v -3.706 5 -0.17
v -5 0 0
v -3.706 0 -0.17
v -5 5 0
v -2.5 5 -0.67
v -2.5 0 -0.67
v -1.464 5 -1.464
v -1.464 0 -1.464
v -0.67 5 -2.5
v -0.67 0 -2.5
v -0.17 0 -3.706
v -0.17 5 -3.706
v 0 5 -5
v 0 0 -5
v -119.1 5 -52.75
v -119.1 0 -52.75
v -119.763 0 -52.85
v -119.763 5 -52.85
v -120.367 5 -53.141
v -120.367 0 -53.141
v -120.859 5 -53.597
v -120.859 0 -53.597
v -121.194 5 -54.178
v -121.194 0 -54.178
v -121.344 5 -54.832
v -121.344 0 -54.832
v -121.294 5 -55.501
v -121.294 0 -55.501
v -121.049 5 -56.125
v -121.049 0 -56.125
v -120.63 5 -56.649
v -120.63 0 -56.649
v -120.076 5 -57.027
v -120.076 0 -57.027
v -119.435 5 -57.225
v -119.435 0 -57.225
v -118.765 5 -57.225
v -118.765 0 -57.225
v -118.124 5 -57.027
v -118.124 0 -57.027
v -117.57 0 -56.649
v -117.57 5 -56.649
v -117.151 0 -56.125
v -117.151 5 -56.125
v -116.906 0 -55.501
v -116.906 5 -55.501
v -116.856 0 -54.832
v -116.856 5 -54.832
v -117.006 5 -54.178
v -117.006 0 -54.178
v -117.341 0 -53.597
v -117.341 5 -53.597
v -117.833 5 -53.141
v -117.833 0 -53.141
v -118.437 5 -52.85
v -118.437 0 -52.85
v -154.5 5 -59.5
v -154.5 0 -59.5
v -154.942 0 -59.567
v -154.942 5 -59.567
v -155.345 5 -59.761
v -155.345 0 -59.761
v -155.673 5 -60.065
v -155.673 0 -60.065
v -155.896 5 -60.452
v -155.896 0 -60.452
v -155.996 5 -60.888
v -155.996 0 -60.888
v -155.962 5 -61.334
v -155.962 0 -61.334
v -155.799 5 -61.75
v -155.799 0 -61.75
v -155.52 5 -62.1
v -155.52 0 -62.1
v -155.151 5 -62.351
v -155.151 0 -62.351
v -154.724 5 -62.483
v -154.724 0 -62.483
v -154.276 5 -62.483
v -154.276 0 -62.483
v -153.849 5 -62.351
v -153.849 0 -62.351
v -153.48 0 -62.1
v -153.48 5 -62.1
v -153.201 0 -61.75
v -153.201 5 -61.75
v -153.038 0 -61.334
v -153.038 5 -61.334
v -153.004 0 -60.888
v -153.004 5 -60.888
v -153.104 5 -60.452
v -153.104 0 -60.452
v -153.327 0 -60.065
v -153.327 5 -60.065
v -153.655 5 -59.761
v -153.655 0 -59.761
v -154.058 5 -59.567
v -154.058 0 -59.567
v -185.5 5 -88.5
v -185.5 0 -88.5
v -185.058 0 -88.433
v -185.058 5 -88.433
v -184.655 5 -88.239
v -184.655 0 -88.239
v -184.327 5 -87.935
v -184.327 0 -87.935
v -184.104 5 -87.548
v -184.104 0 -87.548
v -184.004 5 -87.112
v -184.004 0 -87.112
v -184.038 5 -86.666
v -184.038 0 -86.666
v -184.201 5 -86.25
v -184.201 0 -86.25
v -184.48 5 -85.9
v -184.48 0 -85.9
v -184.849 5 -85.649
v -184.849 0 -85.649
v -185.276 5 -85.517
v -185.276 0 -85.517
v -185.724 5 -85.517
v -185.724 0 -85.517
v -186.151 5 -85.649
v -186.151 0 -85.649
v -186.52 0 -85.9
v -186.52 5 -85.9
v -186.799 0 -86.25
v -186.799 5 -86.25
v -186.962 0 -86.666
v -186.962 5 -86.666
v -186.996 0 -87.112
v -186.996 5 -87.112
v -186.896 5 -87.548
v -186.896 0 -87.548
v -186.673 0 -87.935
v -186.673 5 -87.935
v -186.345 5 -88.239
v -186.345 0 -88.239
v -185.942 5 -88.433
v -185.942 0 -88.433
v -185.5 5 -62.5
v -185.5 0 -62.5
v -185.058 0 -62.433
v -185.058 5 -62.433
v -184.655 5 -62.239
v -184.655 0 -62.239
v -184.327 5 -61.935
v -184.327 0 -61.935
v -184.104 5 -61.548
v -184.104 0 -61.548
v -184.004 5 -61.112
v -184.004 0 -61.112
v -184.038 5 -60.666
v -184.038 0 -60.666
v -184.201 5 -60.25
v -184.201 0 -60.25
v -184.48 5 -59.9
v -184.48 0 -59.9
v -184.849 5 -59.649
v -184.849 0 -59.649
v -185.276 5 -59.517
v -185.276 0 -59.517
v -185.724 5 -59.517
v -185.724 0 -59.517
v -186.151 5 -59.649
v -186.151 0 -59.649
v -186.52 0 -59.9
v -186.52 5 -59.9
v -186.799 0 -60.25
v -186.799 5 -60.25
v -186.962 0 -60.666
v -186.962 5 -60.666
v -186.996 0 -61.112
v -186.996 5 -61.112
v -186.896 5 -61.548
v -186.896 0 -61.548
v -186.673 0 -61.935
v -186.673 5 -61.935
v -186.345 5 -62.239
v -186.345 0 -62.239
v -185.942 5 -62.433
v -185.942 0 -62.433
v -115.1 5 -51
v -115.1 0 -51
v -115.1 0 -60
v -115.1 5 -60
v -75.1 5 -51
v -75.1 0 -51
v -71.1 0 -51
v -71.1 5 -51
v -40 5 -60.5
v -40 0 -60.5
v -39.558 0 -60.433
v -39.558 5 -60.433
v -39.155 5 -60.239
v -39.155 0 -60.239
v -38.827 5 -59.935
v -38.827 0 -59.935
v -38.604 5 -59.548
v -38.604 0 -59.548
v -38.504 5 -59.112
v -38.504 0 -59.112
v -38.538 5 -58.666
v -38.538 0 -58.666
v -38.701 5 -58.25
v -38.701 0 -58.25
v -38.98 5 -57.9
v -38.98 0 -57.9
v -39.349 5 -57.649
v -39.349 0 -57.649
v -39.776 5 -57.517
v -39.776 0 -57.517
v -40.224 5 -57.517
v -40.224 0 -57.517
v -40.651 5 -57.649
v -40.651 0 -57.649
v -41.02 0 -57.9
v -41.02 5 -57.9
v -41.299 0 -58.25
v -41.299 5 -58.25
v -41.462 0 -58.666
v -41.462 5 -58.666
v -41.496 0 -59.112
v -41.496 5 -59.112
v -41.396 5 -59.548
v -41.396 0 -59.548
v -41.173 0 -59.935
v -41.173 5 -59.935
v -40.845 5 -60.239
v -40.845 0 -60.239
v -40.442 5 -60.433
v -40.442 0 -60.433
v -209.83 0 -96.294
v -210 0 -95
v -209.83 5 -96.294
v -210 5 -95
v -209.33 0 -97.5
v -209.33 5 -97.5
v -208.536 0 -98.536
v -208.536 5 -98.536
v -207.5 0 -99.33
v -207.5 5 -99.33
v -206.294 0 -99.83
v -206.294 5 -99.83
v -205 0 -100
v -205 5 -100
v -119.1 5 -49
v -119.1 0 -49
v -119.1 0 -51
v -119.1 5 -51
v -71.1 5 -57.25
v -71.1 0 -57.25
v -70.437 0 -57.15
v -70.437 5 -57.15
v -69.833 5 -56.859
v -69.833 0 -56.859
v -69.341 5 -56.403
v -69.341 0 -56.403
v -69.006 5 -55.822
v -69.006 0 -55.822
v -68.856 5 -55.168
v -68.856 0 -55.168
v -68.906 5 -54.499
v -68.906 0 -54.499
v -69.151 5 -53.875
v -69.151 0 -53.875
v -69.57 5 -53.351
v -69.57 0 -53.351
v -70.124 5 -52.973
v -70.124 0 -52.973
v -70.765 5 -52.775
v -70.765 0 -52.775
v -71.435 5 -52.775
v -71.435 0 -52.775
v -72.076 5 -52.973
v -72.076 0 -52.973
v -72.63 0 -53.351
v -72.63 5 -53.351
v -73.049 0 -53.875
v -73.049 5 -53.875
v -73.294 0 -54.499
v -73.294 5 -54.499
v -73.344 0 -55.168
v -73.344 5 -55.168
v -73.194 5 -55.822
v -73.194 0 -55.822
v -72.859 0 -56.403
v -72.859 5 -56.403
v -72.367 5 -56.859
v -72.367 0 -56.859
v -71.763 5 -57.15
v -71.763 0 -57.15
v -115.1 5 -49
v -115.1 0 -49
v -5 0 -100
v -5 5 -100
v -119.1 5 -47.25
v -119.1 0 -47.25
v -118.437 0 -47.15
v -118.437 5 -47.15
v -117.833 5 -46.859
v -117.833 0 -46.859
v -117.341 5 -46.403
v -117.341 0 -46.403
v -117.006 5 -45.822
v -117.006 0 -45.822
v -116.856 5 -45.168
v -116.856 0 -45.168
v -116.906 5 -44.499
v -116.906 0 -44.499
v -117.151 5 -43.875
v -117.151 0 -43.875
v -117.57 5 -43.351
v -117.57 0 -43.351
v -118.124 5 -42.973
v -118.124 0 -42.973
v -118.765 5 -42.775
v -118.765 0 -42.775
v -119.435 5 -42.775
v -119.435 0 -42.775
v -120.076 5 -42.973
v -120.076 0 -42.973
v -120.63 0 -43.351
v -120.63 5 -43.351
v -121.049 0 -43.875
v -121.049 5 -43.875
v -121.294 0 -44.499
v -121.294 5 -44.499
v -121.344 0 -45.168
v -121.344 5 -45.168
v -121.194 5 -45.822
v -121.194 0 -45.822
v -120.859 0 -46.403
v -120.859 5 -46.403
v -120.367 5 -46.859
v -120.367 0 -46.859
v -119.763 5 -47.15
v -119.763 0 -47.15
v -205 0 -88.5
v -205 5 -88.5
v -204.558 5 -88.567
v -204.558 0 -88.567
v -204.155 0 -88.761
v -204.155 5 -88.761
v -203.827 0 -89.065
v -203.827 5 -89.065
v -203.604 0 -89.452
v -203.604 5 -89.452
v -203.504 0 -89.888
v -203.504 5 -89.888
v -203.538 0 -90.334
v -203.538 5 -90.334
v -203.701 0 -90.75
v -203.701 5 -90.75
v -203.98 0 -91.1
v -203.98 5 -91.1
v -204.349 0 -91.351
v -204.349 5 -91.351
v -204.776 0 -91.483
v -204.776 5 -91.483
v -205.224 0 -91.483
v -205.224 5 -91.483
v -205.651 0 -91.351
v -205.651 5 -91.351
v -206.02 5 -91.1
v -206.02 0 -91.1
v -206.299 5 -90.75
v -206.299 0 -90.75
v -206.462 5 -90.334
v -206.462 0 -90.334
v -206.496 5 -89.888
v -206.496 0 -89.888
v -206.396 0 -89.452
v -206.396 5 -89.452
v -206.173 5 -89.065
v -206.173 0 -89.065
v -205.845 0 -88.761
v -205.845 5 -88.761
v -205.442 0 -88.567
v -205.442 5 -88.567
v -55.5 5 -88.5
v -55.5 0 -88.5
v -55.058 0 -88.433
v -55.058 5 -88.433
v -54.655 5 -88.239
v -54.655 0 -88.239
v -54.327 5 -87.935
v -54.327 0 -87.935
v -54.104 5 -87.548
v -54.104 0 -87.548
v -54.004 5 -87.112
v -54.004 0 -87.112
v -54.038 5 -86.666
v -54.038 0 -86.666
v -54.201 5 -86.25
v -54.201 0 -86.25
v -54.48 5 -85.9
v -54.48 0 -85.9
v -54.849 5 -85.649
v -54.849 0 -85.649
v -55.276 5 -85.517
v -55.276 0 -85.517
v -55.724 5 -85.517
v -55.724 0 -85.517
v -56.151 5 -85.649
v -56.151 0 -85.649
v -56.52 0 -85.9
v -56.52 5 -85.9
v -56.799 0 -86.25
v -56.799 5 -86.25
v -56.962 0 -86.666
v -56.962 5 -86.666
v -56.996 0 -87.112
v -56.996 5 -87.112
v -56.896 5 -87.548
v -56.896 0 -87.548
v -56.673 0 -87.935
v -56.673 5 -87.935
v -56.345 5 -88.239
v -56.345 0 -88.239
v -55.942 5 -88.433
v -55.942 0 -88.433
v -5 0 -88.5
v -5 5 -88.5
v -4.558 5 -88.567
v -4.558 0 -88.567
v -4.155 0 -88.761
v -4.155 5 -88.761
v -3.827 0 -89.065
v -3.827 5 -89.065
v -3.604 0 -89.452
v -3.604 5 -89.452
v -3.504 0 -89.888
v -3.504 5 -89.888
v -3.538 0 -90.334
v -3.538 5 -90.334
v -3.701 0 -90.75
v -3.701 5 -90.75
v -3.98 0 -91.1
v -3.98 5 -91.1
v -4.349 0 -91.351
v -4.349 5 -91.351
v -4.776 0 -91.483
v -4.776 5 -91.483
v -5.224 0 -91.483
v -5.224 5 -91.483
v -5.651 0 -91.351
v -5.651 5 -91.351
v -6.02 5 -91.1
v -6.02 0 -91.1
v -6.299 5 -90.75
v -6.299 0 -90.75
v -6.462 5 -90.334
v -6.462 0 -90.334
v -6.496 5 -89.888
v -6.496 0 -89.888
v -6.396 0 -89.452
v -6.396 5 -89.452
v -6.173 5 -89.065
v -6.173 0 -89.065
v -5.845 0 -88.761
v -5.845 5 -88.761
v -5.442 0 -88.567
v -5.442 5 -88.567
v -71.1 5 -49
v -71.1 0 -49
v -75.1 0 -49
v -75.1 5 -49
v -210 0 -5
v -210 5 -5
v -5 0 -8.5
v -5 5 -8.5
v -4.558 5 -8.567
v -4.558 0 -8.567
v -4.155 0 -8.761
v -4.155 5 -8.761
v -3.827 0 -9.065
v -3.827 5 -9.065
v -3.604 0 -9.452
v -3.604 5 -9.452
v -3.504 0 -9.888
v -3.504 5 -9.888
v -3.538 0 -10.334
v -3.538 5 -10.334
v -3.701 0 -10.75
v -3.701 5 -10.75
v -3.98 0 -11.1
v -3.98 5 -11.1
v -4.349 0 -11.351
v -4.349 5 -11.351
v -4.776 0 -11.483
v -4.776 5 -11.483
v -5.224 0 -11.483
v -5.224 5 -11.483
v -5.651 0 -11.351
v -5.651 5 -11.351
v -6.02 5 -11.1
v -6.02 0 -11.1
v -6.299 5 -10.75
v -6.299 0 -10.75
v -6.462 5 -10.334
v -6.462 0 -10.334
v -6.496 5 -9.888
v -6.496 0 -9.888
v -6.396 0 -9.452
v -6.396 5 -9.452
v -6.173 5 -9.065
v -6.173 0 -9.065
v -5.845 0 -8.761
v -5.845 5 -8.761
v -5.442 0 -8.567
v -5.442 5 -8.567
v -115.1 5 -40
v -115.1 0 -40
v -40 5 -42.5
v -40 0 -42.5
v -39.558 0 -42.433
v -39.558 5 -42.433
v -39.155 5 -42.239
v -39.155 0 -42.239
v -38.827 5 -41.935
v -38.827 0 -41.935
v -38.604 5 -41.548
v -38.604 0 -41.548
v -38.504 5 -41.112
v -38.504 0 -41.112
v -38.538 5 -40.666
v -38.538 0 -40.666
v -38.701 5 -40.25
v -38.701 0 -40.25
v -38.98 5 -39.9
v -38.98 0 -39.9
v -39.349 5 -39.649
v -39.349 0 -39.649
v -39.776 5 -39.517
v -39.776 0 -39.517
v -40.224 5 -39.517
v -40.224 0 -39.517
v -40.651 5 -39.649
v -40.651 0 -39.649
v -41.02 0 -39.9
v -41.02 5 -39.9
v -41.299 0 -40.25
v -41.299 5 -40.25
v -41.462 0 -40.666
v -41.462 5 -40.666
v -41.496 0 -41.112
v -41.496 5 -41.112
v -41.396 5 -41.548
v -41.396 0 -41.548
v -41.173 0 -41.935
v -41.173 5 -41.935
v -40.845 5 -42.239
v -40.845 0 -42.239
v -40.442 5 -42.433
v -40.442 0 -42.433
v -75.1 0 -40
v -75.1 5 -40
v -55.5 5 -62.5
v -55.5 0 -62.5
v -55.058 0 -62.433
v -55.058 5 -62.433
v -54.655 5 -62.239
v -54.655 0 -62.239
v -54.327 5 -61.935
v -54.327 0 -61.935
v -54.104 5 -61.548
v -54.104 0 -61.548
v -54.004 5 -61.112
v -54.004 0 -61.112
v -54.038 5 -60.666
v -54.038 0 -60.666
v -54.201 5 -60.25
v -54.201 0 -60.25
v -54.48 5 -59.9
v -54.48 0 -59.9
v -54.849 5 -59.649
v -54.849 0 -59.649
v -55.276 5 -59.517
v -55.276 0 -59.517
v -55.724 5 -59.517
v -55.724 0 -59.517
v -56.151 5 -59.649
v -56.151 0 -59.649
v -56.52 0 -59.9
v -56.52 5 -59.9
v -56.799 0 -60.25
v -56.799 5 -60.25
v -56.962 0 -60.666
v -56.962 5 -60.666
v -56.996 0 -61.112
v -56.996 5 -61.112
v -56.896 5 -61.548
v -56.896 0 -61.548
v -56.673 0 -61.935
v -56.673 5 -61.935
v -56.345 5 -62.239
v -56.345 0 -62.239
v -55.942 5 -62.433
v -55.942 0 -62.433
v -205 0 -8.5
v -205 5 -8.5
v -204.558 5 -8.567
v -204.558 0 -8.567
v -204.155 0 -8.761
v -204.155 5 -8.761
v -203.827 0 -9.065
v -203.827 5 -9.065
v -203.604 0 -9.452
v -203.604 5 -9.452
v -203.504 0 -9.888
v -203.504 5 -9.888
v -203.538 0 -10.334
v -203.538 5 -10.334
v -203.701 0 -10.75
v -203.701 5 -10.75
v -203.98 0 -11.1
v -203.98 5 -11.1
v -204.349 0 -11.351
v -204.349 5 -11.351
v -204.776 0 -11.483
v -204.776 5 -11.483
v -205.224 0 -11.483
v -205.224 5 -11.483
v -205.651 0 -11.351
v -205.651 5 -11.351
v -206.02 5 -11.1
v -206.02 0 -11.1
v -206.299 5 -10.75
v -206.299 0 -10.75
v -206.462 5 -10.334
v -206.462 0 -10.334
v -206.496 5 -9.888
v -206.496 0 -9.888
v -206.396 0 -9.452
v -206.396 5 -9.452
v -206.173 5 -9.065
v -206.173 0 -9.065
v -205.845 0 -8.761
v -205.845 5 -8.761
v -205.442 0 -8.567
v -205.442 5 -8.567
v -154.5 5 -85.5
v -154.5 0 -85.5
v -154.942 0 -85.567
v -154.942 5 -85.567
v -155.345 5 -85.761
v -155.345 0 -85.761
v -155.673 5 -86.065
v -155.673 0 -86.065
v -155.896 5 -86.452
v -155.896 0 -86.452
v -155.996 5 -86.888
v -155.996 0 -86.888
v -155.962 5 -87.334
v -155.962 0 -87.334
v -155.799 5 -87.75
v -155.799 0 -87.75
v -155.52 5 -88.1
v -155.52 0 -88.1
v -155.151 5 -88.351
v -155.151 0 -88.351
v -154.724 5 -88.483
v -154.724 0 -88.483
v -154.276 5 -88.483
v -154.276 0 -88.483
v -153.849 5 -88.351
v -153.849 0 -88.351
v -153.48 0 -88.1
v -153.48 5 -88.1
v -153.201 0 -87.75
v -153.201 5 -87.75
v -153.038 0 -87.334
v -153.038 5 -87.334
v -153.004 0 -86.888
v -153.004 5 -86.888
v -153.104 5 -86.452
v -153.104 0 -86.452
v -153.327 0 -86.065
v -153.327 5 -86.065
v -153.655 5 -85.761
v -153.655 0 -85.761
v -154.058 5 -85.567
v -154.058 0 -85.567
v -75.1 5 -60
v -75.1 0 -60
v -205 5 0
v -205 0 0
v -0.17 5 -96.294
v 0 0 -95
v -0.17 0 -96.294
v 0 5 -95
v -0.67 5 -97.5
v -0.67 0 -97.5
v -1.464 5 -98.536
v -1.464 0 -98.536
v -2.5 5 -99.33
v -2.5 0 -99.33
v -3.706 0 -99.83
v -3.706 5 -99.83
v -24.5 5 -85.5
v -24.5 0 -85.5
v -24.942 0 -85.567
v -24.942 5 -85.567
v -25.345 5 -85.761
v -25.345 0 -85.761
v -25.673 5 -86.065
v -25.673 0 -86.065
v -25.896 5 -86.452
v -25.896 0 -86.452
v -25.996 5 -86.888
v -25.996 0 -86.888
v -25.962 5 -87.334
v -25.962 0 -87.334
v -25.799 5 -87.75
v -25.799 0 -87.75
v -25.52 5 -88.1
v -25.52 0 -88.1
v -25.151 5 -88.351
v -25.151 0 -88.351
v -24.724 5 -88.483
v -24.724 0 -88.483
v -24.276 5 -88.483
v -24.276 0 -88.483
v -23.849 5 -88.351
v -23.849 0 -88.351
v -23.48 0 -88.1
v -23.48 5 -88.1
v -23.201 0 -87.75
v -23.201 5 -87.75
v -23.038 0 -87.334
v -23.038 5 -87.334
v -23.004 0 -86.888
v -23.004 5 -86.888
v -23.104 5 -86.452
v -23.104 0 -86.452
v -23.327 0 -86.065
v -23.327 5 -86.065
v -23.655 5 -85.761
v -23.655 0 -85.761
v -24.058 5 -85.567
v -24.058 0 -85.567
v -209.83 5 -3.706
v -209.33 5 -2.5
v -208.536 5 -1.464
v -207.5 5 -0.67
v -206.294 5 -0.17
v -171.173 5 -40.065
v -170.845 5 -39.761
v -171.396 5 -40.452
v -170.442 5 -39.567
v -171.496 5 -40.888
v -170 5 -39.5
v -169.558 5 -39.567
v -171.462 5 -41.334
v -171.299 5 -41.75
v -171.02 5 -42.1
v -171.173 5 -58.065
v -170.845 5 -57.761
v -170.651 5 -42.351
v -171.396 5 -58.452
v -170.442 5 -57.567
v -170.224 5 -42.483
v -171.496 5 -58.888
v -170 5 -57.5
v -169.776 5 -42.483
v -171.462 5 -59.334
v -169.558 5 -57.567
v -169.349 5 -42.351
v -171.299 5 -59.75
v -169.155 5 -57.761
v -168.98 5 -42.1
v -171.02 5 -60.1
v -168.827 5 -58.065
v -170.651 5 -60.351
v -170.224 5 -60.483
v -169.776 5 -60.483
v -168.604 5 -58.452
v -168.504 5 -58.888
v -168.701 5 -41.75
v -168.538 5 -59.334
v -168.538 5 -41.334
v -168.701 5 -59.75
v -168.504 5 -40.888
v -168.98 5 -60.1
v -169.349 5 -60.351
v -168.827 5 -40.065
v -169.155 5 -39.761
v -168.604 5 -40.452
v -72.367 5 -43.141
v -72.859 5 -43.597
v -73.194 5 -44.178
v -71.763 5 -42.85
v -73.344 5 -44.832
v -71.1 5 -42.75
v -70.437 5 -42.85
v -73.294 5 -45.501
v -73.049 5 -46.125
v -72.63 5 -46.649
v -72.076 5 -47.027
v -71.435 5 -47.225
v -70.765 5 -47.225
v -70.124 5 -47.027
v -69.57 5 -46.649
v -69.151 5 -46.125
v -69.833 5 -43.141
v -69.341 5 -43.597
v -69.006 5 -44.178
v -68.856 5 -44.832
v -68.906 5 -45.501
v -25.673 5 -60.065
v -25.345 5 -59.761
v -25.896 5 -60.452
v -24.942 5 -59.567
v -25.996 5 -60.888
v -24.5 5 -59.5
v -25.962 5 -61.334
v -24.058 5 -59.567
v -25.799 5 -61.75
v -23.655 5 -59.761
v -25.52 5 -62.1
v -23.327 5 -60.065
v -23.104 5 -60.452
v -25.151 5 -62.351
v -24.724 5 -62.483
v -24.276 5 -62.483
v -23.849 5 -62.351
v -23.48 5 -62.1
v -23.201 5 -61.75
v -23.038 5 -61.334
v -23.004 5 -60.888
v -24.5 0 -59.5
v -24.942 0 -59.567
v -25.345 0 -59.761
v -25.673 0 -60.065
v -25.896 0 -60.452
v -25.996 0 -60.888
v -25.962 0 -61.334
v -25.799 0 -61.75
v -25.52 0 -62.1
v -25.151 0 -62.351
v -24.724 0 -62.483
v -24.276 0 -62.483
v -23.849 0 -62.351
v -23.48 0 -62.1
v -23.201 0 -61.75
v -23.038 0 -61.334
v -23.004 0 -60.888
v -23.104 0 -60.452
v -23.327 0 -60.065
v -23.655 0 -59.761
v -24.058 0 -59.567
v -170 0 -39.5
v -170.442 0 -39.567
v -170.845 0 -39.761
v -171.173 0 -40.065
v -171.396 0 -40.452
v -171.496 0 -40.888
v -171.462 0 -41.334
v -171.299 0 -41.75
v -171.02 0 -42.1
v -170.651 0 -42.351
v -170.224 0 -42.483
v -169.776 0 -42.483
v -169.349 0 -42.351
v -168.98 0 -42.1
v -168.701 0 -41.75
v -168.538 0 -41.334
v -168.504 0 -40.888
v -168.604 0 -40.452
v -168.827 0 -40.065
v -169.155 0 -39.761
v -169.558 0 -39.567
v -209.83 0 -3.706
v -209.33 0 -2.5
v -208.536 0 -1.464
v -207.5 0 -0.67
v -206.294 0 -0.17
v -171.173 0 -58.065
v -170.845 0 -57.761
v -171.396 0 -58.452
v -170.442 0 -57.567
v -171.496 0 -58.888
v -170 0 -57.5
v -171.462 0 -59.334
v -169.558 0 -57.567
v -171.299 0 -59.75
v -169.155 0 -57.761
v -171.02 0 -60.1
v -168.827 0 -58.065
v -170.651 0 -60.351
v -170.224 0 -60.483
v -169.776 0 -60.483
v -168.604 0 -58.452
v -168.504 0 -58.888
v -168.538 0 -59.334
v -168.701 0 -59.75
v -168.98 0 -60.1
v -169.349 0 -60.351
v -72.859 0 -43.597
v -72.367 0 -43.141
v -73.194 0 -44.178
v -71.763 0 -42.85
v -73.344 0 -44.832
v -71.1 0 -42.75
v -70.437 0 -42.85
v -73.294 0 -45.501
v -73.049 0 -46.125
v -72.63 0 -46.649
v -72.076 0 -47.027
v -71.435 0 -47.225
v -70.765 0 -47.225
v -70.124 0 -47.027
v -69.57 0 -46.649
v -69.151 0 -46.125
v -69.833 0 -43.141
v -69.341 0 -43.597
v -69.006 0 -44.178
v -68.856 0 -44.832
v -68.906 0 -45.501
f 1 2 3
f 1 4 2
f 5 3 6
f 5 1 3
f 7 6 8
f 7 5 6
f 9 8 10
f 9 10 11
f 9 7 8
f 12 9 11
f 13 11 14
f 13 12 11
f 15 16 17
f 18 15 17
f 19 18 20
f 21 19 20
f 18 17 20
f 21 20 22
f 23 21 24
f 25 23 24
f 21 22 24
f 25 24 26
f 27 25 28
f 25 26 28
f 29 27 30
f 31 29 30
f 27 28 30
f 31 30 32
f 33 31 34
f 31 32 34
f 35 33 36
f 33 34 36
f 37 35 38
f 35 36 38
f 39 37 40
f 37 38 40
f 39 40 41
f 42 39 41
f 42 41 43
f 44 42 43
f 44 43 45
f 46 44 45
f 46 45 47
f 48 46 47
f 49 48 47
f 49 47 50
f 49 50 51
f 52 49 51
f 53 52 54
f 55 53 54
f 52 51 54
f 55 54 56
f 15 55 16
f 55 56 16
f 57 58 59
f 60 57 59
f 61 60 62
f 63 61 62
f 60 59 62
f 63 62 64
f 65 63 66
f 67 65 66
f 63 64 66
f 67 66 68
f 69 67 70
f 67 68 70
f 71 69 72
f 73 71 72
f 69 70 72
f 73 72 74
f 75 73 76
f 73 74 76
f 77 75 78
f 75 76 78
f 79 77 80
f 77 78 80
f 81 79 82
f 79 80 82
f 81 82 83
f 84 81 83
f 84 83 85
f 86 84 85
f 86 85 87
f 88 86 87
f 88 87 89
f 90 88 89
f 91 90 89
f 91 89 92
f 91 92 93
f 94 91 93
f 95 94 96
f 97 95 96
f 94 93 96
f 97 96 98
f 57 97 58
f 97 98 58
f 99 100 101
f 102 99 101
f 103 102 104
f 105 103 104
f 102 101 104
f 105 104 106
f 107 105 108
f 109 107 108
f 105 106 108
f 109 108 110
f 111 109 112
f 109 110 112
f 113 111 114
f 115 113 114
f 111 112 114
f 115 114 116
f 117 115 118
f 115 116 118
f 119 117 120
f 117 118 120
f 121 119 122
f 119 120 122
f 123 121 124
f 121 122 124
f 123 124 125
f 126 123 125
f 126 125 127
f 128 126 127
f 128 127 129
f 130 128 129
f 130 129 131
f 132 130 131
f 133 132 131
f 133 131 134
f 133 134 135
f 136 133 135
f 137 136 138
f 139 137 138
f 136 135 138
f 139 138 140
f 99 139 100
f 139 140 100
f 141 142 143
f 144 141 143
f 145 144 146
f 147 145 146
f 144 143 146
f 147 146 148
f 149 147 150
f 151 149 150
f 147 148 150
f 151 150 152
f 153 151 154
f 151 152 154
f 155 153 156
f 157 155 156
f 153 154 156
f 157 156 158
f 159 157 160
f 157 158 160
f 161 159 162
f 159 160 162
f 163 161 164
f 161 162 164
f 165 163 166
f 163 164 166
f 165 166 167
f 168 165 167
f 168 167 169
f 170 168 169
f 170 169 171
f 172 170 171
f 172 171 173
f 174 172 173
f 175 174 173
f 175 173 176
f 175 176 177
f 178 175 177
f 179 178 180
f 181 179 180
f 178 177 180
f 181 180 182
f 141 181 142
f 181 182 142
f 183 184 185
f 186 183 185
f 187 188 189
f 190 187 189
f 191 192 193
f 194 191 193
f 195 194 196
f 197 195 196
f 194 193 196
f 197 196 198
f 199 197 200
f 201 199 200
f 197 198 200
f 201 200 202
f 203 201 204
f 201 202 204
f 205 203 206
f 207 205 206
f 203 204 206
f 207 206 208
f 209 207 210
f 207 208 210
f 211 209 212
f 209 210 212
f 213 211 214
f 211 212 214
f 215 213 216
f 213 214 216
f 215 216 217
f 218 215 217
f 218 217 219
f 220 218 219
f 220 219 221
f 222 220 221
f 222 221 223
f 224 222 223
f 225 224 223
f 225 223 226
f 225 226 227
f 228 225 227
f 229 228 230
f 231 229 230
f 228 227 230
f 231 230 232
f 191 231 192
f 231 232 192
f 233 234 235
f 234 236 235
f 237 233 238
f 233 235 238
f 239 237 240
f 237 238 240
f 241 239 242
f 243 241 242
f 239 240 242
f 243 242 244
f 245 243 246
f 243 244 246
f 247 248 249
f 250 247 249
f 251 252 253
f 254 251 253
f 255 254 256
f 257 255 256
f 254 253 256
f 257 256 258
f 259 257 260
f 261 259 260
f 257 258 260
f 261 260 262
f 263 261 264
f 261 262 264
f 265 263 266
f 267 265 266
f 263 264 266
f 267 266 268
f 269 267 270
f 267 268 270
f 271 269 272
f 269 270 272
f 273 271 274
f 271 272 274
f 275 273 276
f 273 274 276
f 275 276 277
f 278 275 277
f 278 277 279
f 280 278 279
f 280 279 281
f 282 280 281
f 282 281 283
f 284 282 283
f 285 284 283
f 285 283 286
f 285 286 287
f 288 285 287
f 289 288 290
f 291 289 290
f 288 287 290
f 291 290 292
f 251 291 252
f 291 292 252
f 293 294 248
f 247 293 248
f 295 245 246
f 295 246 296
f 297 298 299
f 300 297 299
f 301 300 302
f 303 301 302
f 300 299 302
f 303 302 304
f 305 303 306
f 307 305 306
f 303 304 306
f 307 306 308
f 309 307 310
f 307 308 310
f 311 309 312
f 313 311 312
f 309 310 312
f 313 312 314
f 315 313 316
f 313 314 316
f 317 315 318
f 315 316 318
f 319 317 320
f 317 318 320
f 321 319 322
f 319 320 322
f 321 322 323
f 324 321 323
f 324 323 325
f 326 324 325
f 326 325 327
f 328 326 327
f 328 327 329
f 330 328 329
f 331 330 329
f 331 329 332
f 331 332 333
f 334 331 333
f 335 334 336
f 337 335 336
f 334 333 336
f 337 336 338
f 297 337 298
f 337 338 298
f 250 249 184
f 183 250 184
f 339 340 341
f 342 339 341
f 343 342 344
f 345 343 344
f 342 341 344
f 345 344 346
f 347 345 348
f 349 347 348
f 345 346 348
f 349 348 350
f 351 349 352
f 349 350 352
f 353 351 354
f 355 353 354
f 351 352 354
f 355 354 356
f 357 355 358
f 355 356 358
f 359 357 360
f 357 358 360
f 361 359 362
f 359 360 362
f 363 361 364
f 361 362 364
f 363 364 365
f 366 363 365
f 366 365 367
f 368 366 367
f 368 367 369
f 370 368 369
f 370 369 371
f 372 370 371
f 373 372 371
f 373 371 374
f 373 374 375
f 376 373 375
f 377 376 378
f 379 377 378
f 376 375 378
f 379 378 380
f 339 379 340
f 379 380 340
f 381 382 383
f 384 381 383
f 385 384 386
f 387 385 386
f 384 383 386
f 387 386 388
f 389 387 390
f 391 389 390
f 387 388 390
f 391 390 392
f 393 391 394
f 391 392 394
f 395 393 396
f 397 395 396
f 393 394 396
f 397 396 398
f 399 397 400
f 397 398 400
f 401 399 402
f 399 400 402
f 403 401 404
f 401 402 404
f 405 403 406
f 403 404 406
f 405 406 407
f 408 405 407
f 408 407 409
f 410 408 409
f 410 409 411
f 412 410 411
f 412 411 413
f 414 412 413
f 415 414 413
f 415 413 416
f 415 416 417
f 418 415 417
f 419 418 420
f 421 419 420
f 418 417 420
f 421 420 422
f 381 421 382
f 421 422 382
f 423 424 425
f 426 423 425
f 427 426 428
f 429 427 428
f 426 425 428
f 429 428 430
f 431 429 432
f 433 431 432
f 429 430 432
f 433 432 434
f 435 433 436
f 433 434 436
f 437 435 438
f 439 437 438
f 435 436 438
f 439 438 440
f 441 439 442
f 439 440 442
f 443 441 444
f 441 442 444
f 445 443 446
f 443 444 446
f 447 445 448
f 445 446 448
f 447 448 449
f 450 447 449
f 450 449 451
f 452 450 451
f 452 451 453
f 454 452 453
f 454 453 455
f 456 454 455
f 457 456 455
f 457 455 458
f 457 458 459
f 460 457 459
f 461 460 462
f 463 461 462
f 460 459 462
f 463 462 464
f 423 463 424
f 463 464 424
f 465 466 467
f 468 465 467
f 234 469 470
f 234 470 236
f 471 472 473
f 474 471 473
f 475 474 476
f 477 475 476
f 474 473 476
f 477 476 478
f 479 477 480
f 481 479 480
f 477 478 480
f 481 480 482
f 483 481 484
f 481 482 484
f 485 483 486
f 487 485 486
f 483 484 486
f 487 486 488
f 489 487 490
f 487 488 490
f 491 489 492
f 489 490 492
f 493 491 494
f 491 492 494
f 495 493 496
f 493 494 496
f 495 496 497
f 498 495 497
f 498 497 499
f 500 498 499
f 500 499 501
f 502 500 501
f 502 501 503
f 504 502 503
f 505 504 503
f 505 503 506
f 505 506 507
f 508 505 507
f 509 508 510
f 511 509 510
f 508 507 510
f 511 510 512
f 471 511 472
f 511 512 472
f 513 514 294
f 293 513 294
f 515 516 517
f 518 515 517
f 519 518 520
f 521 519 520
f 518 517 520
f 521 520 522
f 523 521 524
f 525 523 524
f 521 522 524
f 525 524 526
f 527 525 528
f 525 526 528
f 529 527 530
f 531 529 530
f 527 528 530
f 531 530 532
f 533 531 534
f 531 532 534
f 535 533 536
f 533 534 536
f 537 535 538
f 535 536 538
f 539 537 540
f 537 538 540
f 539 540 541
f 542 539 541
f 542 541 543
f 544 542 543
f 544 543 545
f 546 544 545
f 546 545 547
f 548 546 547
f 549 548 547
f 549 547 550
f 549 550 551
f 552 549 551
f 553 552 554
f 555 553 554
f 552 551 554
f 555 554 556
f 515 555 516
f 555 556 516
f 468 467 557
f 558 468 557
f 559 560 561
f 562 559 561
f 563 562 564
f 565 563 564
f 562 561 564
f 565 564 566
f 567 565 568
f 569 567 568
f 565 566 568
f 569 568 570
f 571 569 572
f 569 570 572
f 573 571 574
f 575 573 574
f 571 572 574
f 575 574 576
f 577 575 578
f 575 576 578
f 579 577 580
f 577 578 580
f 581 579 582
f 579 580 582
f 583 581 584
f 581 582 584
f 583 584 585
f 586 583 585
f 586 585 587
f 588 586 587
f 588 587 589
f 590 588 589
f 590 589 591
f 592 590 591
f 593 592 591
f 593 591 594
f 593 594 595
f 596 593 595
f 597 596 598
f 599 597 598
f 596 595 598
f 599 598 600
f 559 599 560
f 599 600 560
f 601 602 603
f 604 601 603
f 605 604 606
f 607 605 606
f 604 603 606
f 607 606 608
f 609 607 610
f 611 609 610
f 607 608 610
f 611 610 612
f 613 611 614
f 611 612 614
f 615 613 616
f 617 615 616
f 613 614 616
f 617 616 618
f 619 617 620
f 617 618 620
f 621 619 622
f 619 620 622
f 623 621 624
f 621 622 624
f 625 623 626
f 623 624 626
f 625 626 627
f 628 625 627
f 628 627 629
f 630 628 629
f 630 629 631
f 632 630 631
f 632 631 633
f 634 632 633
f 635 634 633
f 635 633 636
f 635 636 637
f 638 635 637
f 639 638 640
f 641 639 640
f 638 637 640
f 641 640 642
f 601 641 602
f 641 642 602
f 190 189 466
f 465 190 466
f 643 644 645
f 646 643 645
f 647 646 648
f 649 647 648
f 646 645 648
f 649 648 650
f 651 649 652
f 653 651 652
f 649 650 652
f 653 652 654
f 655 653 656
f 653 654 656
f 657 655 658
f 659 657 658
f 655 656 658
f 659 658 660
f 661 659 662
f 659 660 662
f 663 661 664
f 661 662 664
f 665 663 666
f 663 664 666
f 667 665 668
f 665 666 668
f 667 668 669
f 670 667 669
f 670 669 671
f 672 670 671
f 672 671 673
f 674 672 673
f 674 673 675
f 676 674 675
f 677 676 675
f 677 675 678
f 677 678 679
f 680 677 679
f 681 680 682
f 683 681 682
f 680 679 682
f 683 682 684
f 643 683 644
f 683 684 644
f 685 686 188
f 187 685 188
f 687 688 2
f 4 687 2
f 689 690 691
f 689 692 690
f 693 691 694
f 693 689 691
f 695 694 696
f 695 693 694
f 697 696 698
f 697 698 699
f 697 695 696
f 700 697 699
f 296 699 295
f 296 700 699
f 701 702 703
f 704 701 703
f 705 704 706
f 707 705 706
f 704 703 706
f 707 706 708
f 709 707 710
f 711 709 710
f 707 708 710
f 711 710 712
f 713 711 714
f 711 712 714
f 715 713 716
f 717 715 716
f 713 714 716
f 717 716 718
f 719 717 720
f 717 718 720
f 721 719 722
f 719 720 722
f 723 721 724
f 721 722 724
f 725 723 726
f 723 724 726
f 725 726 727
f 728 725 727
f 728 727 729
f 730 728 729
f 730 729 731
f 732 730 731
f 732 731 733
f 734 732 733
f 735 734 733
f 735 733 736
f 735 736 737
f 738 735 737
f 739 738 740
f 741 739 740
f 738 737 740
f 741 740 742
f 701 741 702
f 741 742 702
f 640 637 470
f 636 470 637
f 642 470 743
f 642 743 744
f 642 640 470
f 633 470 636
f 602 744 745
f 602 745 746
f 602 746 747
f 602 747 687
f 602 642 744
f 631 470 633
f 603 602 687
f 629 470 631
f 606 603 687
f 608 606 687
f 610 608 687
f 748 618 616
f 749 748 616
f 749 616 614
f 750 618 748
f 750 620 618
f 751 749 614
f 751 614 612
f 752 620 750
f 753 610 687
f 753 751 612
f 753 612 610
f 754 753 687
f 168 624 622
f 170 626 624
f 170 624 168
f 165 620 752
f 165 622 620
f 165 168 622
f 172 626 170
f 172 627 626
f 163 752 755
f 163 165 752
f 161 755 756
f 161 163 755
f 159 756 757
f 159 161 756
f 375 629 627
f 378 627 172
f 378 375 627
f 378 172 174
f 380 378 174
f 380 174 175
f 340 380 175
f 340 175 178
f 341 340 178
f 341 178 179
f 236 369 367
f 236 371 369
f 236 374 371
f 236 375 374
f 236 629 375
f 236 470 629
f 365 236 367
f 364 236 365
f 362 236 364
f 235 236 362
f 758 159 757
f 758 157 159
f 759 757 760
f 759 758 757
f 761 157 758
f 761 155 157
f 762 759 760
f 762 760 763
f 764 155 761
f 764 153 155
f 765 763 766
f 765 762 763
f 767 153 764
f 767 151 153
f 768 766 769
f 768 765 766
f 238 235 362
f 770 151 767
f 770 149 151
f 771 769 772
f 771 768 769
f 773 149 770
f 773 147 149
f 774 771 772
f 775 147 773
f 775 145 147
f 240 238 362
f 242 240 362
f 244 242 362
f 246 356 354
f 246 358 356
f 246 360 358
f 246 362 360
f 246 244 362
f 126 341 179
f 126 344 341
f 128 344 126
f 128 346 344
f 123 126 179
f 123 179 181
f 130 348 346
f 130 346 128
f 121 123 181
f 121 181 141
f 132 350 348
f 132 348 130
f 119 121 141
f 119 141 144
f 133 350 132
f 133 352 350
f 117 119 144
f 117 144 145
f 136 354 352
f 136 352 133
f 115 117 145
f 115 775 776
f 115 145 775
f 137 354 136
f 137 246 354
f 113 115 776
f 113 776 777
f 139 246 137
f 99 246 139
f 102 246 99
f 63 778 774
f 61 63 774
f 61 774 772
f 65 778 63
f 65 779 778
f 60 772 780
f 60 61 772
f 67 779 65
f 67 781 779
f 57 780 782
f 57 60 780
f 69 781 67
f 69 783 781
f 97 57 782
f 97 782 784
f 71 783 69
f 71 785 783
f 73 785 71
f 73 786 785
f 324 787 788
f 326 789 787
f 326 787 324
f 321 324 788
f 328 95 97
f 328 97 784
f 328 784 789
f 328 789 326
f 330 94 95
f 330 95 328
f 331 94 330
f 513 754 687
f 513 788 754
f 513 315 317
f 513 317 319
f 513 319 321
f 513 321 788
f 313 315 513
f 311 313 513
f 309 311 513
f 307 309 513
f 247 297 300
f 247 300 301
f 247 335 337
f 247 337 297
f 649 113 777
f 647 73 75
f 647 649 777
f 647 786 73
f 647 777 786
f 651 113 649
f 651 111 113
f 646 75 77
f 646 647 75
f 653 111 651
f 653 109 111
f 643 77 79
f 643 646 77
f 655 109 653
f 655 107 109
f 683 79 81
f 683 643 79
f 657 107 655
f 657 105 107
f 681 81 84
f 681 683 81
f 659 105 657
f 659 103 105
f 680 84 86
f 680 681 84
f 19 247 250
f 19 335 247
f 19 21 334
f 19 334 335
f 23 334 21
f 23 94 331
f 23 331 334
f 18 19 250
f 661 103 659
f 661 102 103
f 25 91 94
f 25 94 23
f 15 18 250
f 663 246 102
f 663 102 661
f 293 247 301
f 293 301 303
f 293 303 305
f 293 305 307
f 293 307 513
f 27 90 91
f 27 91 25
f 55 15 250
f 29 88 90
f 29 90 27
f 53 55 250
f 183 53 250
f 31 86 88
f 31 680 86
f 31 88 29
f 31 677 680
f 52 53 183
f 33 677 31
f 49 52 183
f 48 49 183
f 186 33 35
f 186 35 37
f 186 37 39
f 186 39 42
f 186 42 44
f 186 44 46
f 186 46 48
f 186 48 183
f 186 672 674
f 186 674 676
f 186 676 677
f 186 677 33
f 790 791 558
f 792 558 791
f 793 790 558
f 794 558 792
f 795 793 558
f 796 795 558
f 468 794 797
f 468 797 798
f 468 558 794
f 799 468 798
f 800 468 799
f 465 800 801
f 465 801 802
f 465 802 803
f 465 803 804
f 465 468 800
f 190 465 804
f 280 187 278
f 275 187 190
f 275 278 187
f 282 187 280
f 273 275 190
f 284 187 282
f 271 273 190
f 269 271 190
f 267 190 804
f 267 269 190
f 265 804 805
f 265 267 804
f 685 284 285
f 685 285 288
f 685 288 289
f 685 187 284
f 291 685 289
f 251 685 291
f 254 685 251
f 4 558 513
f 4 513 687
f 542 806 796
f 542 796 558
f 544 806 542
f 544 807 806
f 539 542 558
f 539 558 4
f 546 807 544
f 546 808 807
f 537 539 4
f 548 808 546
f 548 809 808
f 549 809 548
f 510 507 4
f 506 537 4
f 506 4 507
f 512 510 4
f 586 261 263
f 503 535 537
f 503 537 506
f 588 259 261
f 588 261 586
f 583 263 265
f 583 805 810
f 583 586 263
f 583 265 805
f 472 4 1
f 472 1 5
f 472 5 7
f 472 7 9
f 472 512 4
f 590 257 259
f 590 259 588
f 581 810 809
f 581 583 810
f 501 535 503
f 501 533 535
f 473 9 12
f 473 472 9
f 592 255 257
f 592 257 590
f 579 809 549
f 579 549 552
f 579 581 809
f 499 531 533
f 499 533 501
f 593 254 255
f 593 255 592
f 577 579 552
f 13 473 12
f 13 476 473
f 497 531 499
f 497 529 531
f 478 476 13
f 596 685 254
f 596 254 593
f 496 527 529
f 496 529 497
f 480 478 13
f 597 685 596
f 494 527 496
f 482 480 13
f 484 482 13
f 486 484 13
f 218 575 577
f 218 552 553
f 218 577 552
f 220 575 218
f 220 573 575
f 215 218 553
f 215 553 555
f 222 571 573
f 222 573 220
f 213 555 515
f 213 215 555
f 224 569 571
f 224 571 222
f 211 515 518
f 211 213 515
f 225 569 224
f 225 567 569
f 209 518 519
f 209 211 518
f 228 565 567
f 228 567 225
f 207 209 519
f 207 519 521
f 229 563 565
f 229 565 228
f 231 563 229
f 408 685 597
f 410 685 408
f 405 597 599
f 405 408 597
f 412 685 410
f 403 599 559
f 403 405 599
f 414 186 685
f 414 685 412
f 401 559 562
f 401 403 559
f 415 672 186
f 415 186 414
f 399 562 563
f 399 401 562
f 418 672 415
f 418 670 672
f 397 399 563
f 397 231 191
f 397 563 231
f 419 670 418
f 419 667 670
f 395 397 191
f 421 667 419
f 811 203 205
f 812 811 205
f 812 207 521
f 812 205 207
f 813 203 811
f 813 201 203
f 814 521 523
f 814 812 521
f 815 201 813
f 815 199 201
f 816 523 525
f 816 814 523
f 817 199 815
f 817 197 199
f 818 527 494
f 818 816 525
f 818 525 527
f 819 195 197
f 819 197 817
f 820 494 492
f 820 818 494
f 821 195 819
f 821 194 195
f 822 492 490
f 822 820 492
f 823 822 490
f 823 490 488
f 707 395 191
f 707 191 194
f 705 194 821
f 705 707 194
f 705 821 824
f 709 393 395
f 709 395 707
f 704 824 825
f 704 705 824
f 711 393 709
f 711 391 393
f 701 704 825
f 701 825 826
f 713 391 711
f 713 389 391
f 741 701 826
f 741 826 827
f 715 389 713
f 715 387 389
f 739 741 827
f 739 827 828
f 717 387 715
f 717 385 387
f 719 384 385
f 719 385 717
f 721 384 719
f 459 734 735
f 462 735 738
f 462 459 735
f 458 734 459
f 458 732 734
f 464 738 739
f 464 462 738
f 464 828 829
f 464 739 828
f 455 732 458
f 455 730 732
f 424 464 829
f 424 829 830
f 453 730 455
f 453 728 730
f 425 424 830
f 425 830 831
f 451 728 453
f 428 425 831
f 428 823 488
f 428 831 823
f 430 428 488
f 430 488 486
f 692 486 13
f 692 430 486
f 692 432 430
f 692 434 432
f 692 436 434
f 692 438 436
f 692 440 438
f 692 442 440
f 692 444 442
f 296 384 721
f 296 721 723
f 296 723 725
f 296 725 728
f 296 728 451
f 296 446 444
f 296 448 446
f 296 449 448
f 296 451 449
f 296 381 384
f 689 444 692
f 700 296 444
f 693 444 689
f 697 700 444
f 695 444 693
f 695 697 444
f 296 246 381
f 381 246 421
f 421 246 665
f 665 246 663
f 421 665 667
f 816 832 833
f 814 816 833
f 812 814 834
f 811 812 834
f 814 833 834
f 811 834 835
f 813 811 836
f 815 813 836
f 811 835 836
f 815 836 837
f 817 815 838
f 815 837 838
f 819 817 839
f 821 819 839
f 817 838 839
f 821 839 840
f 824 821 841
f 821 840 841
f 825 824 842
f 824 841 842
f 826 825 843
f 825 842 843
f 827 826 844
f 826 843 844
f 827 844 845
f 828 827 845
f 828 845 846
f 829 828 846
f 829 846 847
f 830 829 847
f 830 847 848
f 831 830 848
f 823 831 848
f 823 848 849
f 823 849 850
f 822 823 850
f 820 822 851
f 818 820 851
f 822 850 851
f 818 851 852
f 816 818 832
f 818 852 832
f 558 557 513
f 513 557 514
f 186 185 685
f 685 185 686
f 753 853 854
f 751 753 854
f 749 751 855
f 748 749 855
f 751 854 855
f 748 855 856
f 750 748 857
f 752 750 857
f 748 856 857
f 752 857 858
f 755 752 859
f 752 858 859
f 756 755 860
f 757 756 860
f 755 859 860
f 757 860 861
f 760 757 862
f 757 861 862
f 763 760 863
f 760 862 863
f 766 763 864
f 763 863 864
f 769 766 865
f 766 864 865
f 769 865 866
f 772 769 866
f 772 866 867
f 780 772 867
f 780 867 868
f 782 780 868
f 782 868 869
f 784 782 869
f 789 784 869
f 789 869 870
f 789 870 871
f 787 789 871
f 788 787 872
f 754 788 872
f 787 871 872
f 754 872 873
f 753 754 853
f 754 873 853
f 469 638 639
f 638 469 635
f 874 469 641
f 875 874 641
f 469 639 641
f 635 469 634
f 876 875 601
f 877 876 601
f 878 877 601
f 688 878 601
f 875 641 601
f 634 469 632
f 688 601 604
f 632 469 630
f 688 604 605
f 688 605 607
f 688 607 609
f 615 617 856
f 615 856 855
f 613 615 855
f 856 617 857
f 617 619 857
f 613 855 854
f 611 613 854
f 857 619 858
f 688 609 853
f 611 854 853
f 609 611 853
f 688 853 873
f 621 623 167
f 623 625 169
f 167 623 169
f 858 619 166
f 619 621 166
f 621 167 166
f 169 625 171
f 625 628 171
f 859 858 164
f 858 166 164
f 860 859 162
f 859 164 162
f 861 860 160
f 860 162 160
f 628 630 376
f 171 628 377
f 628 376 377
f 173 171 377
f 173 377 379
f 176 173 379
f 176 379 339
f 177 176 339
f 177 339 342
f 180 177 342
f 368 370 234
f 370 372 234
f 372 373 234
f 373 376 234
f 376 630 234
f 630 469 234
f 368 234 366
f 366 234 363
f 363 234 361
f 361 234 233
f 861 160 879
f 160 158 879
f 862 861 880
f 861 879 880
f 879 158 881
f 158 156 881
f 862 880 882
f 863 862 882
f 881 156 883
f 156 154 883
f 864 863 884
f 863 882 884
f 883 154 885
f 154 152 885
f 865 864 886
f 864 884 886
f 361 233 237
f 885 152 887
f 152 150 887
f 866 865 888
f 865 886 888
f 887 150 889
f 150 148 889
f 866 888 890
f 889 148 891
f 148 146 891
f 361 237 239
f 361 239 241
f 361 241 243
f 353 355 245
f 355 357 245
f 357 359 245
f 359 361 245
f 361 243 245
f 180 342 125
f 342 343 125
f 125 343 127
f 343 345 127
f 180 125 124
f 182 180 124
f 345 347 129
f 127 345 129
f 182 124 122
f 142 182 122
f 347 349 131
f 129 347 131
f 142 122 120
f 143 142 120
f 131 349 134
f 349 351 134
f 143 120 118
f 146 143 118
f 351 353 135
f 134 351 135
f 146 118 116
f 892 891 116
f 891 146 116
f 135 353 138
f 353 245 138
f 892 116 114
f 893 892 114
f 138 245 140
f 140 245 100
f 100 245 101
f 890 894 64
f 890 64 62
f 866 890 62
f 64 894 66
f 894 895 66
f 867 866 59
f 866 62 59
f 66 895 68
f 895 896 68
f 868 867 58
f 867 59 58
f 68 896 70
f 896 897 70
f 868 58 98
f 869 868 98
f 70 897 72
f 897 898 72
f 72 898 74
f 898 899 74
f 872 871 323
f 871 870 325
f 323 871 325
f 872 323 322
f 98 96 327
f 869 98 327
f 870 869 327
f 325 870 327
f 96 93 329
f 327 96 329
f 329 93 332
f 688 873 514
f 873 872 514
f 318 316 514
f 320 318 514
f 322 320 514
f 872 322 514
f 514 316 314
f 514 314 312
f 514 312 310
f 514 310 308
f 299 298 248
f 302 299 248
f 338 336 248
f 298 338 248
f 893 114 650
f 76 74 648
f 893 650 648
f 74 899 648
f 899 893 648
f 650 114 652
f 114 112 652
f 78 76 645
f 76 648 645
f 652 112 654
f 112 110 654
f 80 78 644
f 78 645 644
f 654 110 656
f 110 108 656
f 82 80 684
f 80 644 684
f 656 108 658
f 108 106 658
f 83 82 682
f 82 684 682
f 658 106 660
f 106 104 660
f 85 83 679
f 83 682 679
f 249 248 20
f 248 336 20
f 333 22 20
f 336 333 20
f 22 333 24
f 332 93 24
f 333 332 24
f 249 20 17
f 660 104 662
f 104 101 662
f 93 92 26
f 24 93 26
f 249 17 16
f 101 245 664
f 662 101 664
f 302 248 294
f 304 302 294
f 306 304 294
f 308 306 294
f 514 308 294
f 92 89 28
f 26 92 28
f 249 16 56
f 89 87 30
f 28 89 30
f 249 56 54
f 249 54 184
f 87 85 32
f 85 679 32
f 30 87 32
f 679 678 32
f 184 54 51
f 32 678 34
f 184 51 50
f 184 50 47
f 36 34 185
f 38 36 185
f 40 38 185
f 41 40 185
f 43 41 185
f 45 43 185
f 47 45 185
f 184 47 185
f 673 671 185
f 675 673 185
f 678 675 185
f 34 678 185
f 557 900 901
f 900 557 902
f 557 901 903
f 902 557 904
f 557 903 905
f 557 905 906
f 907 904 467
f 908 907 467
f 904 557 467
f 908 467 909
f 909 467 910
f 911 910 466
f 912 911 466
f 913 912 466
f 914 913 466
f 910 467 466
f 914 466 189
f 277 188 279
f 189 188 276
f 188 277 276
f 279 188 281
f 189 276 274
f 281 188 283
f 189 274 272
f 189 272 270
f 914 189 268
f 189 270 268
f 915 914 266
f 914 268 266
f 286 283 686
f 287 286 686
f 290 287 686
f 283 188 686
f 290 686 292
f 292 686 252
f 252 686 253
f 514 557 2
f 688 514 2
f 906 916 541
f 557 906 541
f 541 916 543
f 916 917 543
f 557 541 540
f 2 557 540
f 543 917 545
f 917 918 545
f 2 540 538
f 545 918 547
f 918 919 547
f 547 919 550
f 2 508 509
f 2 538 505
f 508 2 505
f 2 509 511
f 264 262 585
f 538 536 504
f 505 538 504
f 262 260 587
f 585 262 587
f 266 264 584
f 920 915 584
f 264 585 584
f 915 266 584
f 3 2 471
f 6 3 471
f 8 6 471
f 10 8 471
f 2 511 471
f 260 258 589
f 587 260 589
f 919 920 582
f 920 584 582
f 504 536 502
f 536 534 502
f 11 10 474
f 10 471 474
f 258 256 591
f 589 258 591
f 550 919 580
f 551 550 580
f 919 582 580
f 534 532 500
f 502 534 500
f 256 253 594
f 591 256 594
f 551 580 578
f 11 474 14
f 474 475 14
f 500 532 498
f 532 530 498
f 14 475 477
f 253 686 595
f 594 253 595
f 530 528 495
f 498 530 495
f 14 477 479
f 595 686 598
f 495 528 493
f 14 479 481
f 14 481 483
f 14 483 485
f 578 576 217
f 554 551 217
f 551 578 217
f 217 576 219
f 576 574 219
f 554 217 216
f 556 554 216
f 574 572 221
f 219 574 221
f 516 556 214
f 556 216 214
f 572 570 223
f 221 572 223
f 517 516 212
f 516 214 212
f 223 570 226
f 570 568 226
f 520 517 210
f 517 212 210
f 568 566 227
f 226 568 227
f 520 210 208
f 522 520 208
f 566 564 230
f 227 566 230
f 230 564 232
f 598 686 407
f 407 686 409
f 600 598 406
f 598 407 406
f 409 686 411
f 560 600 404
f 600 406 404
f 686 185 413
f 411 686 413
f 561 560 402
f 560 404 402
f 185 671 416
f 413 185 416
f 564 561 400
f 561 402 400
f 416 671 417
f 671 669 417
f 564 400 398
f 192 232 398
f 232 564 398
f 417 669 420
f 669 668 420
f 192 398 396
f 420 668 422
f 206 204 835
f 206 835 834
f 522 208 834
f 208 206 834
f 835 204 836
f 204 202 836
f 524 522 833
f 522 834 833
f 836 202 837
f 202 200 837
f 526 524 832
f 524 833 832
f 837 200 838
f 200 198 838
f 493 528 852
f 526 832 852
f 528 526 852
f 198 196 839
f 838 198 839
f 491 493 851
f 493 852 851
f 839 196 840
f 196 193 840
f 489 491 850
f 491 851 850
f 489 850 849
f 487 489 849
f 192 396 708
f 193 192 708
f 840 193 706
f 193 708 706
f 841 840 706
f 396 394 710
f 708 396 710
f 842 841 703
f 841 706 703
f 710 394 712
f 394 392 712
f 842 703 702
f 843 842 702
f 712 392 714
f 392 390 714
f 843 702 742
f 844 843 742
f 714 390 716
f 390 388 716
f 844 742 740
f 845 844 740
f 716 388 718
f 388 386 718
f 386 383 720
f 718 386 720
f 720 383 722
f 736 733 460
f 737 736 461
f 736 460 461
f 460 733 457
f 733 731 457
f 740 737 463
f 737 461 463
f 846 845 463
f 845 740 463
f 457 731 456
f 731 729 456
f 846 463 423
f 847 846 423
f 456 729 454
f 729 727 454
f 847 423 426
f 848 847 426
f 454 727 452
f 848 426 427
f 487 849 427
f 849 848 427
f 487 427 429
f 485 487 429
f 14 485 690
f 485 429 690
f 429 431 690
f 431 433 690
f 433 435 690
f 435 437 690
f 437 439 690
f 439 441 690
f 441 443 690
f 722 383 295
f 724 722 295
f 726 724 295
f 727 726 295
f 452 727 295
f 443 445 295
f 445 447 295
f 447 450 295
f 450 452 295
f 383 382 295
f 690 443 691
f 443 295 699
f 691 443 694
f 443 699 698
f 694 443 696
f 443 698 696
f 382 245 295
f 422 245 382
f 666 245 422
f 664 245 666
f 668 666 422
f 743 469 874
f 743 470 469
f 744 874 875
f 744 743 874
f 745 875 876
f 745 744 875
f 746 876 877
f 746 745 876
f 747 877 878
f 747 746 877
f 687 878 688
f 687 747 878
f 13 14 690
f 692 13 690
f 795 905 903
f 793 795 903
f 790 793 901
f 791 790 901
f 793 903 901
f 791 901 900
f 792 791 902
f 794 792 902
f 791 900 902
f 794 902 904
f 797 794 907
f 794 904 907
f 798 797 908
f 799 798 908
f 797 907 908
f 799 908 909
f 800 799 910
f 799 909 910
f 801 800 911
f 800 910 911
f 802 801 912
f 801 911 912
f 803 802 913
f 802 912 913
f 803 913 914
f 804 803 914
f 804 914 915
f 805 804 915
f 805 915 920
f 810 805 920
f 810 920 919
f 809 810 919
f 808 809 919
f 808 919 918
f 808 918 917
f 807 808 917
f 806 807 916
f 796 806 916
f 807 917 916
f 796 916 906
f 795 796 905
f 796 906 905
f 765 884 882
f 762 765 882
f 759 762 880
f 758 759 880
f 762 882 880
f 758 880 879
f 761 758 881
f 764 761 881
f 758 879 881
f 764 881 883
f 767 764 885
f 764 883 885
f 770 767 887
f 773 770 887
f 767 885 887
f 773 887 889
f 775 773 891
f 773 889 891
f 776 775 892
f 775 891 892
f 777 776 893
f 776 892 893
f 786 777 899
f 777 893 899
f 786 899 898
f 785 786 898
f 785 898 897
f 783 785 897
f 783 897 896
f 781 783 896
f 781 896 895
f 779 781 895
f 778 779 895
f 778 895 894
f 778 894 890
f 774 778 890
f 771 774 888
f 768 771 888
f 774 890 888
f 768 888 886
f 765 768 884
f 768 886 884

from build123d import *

# Parameters (mm, degrees)
SKETCH_1_W          = 210
SKETCH_1_H          = 100
EXTRUDE_1_DEPTH     = 5
FILLET_1_R          = 5
SKETCH_2_R          = 1.5
CUT_EXTRUDE_1_DEPTH = 5
SKETCH_4_R          = 2.25
CUT_EXTRUDE_2_DEPTH = 5
SKETCH_6_R          = 1.5
CUT_EXTRUDE_3_DEPTH = 5


with BuildPart() as part:
    # 草图1 → 凸台-拉伸1 (new body)
    with BuildSketch(Plane(origin=(0, 0, 0), x_dir=(1, 0, 0), z_dir=(0, 1, 0))):
        with Locations((-105, 50)):
            Rectangle(SKETCH_1_W, SKETCH_1_H)
    extrude(amount=EXTRUDE_1_DEPTH)

    # 圆角1
    fillet_1_edges = [part.edges().sort_by_distance(p)[0] for p in [
        (-210, 2.5, -100),
        (0, 2.5, -100),
        (0, 2.5, 0),
        (-210, 2.5, 0),
    ]]
    fillet(fillet_1_edges, radius=FILLET_1_R)

    # 草图2 → 切除-拉伸1 (cut)
    with BuildSketch(Plane(origin=(0, 5, 0), x_dir=(1, 0, 0), z_dir=(0, 1, 0))):
        with Locations(Location((-205, 90, 0), (0, 0, 270))):
            Circle(SKETCH_2_R)
        with Locations(Location((-205, 10, 0), (0, 0, 270))):
            Circle(SKETCH_2_R)
        with Locations(Location((-5, 10, 0), (0, 0, 270))):
            Circle(SKETCH_2_R)
        with Locations(Location((-5, 90, 0), (0, 0, 270))):
            Circle(SKETCH_2_R)
    extrude(amount=-CUT_EXTRUDE_1_DEPTH, mode=Mode.SUBTRACT)

    # 草图4 → 切除-拉伸2 (cut)
    with BuildSketch(Plane.XZ):
        with Locations(Location((-119.1, -45, 0), (0, 0, 270))):
            Circle(SKETCH_4_R)
        with Locations(Location((-119.1, -55, 0), (0, 0, 90))):
            Circle(SKETCH_4_R)
        with Locations(Location((-71.1, -55, 0), (0, 0, 270))):
            Circle(SKETCH_4_R)
        with Locations(Location((-71.1, -45, 0), (0, 0, 90))):
            Circle(SKETCH_4_R)
        Polygon((-115.1, -60), (-75.1, -60), (-75.1, -51), (-71.1, -51), (-71.1, -49), (-75.1, -49), (-75.1, -40), (-115.1, -40), (-115.1, -49), (-119.1, -49), (-119.1, -51), (-115.1, -51), align=None)
    extrude(amount=-CUT_EXTRUDE_2_DEPTH, mode=Mode.SUBTRACT)

    # 草图6 → 切除-拉伸3 (cut)
    with BuildSketch(Plane.XZ):
        with Locations(Location((-40, -41, 0), (0, 0, 270))):
            Circle(SKETCH_6_R)
        with Locations(Location((-40, -59, 0), (0, 0, 270))):
            Circle(SKETCH_6_R)
        with Locations(Location((-170, -59, 0), (0, 0, 90))):
            Circle(SKETCH_6_R)
        with Locations(Location((-170, -41, 0), (0, 0, 90))):
            Circle(SKETCH_6_R)
        with Locations(Location((-185.5, -87, 0), (0, 0, 270))):
            Circle(SKETCH_6_R)
        with Locations(Location((-185.5, -61, 0), (0, 0, 270))):
            Circle(SKETCH_6_R)
        with Locations(Location((-154.5, -87, 0), (0, 0, 90))):
            Circle(SKETCH_6_R)
        with Locations(Location((-154.5, -61, 0), (0, 0, 90))):
            Circle(SKETCH_6_R)
        with Locations(Location((-55.5, -87, 0), (0, 0, 270))):
            Circle(SKETCH_6_R)
        with Locations(Location((-24.5, -87, 0), (0, 0, 90))):
            Circle(SKETCH_6_R)
        with Locations(Location((-55.5, -61, 0), (0, 0, 270))):
            Circle(SKETCH_6_R)
        with Locations(Location((-24.5, -61, 0), (0, 0, 90))):
            Circle(SKETCH_6_R)
    extrude(amount=-CUT_EXTRUDE_3_DEPTH, mode=Mode.SUBTRACT)


solid = part.part
